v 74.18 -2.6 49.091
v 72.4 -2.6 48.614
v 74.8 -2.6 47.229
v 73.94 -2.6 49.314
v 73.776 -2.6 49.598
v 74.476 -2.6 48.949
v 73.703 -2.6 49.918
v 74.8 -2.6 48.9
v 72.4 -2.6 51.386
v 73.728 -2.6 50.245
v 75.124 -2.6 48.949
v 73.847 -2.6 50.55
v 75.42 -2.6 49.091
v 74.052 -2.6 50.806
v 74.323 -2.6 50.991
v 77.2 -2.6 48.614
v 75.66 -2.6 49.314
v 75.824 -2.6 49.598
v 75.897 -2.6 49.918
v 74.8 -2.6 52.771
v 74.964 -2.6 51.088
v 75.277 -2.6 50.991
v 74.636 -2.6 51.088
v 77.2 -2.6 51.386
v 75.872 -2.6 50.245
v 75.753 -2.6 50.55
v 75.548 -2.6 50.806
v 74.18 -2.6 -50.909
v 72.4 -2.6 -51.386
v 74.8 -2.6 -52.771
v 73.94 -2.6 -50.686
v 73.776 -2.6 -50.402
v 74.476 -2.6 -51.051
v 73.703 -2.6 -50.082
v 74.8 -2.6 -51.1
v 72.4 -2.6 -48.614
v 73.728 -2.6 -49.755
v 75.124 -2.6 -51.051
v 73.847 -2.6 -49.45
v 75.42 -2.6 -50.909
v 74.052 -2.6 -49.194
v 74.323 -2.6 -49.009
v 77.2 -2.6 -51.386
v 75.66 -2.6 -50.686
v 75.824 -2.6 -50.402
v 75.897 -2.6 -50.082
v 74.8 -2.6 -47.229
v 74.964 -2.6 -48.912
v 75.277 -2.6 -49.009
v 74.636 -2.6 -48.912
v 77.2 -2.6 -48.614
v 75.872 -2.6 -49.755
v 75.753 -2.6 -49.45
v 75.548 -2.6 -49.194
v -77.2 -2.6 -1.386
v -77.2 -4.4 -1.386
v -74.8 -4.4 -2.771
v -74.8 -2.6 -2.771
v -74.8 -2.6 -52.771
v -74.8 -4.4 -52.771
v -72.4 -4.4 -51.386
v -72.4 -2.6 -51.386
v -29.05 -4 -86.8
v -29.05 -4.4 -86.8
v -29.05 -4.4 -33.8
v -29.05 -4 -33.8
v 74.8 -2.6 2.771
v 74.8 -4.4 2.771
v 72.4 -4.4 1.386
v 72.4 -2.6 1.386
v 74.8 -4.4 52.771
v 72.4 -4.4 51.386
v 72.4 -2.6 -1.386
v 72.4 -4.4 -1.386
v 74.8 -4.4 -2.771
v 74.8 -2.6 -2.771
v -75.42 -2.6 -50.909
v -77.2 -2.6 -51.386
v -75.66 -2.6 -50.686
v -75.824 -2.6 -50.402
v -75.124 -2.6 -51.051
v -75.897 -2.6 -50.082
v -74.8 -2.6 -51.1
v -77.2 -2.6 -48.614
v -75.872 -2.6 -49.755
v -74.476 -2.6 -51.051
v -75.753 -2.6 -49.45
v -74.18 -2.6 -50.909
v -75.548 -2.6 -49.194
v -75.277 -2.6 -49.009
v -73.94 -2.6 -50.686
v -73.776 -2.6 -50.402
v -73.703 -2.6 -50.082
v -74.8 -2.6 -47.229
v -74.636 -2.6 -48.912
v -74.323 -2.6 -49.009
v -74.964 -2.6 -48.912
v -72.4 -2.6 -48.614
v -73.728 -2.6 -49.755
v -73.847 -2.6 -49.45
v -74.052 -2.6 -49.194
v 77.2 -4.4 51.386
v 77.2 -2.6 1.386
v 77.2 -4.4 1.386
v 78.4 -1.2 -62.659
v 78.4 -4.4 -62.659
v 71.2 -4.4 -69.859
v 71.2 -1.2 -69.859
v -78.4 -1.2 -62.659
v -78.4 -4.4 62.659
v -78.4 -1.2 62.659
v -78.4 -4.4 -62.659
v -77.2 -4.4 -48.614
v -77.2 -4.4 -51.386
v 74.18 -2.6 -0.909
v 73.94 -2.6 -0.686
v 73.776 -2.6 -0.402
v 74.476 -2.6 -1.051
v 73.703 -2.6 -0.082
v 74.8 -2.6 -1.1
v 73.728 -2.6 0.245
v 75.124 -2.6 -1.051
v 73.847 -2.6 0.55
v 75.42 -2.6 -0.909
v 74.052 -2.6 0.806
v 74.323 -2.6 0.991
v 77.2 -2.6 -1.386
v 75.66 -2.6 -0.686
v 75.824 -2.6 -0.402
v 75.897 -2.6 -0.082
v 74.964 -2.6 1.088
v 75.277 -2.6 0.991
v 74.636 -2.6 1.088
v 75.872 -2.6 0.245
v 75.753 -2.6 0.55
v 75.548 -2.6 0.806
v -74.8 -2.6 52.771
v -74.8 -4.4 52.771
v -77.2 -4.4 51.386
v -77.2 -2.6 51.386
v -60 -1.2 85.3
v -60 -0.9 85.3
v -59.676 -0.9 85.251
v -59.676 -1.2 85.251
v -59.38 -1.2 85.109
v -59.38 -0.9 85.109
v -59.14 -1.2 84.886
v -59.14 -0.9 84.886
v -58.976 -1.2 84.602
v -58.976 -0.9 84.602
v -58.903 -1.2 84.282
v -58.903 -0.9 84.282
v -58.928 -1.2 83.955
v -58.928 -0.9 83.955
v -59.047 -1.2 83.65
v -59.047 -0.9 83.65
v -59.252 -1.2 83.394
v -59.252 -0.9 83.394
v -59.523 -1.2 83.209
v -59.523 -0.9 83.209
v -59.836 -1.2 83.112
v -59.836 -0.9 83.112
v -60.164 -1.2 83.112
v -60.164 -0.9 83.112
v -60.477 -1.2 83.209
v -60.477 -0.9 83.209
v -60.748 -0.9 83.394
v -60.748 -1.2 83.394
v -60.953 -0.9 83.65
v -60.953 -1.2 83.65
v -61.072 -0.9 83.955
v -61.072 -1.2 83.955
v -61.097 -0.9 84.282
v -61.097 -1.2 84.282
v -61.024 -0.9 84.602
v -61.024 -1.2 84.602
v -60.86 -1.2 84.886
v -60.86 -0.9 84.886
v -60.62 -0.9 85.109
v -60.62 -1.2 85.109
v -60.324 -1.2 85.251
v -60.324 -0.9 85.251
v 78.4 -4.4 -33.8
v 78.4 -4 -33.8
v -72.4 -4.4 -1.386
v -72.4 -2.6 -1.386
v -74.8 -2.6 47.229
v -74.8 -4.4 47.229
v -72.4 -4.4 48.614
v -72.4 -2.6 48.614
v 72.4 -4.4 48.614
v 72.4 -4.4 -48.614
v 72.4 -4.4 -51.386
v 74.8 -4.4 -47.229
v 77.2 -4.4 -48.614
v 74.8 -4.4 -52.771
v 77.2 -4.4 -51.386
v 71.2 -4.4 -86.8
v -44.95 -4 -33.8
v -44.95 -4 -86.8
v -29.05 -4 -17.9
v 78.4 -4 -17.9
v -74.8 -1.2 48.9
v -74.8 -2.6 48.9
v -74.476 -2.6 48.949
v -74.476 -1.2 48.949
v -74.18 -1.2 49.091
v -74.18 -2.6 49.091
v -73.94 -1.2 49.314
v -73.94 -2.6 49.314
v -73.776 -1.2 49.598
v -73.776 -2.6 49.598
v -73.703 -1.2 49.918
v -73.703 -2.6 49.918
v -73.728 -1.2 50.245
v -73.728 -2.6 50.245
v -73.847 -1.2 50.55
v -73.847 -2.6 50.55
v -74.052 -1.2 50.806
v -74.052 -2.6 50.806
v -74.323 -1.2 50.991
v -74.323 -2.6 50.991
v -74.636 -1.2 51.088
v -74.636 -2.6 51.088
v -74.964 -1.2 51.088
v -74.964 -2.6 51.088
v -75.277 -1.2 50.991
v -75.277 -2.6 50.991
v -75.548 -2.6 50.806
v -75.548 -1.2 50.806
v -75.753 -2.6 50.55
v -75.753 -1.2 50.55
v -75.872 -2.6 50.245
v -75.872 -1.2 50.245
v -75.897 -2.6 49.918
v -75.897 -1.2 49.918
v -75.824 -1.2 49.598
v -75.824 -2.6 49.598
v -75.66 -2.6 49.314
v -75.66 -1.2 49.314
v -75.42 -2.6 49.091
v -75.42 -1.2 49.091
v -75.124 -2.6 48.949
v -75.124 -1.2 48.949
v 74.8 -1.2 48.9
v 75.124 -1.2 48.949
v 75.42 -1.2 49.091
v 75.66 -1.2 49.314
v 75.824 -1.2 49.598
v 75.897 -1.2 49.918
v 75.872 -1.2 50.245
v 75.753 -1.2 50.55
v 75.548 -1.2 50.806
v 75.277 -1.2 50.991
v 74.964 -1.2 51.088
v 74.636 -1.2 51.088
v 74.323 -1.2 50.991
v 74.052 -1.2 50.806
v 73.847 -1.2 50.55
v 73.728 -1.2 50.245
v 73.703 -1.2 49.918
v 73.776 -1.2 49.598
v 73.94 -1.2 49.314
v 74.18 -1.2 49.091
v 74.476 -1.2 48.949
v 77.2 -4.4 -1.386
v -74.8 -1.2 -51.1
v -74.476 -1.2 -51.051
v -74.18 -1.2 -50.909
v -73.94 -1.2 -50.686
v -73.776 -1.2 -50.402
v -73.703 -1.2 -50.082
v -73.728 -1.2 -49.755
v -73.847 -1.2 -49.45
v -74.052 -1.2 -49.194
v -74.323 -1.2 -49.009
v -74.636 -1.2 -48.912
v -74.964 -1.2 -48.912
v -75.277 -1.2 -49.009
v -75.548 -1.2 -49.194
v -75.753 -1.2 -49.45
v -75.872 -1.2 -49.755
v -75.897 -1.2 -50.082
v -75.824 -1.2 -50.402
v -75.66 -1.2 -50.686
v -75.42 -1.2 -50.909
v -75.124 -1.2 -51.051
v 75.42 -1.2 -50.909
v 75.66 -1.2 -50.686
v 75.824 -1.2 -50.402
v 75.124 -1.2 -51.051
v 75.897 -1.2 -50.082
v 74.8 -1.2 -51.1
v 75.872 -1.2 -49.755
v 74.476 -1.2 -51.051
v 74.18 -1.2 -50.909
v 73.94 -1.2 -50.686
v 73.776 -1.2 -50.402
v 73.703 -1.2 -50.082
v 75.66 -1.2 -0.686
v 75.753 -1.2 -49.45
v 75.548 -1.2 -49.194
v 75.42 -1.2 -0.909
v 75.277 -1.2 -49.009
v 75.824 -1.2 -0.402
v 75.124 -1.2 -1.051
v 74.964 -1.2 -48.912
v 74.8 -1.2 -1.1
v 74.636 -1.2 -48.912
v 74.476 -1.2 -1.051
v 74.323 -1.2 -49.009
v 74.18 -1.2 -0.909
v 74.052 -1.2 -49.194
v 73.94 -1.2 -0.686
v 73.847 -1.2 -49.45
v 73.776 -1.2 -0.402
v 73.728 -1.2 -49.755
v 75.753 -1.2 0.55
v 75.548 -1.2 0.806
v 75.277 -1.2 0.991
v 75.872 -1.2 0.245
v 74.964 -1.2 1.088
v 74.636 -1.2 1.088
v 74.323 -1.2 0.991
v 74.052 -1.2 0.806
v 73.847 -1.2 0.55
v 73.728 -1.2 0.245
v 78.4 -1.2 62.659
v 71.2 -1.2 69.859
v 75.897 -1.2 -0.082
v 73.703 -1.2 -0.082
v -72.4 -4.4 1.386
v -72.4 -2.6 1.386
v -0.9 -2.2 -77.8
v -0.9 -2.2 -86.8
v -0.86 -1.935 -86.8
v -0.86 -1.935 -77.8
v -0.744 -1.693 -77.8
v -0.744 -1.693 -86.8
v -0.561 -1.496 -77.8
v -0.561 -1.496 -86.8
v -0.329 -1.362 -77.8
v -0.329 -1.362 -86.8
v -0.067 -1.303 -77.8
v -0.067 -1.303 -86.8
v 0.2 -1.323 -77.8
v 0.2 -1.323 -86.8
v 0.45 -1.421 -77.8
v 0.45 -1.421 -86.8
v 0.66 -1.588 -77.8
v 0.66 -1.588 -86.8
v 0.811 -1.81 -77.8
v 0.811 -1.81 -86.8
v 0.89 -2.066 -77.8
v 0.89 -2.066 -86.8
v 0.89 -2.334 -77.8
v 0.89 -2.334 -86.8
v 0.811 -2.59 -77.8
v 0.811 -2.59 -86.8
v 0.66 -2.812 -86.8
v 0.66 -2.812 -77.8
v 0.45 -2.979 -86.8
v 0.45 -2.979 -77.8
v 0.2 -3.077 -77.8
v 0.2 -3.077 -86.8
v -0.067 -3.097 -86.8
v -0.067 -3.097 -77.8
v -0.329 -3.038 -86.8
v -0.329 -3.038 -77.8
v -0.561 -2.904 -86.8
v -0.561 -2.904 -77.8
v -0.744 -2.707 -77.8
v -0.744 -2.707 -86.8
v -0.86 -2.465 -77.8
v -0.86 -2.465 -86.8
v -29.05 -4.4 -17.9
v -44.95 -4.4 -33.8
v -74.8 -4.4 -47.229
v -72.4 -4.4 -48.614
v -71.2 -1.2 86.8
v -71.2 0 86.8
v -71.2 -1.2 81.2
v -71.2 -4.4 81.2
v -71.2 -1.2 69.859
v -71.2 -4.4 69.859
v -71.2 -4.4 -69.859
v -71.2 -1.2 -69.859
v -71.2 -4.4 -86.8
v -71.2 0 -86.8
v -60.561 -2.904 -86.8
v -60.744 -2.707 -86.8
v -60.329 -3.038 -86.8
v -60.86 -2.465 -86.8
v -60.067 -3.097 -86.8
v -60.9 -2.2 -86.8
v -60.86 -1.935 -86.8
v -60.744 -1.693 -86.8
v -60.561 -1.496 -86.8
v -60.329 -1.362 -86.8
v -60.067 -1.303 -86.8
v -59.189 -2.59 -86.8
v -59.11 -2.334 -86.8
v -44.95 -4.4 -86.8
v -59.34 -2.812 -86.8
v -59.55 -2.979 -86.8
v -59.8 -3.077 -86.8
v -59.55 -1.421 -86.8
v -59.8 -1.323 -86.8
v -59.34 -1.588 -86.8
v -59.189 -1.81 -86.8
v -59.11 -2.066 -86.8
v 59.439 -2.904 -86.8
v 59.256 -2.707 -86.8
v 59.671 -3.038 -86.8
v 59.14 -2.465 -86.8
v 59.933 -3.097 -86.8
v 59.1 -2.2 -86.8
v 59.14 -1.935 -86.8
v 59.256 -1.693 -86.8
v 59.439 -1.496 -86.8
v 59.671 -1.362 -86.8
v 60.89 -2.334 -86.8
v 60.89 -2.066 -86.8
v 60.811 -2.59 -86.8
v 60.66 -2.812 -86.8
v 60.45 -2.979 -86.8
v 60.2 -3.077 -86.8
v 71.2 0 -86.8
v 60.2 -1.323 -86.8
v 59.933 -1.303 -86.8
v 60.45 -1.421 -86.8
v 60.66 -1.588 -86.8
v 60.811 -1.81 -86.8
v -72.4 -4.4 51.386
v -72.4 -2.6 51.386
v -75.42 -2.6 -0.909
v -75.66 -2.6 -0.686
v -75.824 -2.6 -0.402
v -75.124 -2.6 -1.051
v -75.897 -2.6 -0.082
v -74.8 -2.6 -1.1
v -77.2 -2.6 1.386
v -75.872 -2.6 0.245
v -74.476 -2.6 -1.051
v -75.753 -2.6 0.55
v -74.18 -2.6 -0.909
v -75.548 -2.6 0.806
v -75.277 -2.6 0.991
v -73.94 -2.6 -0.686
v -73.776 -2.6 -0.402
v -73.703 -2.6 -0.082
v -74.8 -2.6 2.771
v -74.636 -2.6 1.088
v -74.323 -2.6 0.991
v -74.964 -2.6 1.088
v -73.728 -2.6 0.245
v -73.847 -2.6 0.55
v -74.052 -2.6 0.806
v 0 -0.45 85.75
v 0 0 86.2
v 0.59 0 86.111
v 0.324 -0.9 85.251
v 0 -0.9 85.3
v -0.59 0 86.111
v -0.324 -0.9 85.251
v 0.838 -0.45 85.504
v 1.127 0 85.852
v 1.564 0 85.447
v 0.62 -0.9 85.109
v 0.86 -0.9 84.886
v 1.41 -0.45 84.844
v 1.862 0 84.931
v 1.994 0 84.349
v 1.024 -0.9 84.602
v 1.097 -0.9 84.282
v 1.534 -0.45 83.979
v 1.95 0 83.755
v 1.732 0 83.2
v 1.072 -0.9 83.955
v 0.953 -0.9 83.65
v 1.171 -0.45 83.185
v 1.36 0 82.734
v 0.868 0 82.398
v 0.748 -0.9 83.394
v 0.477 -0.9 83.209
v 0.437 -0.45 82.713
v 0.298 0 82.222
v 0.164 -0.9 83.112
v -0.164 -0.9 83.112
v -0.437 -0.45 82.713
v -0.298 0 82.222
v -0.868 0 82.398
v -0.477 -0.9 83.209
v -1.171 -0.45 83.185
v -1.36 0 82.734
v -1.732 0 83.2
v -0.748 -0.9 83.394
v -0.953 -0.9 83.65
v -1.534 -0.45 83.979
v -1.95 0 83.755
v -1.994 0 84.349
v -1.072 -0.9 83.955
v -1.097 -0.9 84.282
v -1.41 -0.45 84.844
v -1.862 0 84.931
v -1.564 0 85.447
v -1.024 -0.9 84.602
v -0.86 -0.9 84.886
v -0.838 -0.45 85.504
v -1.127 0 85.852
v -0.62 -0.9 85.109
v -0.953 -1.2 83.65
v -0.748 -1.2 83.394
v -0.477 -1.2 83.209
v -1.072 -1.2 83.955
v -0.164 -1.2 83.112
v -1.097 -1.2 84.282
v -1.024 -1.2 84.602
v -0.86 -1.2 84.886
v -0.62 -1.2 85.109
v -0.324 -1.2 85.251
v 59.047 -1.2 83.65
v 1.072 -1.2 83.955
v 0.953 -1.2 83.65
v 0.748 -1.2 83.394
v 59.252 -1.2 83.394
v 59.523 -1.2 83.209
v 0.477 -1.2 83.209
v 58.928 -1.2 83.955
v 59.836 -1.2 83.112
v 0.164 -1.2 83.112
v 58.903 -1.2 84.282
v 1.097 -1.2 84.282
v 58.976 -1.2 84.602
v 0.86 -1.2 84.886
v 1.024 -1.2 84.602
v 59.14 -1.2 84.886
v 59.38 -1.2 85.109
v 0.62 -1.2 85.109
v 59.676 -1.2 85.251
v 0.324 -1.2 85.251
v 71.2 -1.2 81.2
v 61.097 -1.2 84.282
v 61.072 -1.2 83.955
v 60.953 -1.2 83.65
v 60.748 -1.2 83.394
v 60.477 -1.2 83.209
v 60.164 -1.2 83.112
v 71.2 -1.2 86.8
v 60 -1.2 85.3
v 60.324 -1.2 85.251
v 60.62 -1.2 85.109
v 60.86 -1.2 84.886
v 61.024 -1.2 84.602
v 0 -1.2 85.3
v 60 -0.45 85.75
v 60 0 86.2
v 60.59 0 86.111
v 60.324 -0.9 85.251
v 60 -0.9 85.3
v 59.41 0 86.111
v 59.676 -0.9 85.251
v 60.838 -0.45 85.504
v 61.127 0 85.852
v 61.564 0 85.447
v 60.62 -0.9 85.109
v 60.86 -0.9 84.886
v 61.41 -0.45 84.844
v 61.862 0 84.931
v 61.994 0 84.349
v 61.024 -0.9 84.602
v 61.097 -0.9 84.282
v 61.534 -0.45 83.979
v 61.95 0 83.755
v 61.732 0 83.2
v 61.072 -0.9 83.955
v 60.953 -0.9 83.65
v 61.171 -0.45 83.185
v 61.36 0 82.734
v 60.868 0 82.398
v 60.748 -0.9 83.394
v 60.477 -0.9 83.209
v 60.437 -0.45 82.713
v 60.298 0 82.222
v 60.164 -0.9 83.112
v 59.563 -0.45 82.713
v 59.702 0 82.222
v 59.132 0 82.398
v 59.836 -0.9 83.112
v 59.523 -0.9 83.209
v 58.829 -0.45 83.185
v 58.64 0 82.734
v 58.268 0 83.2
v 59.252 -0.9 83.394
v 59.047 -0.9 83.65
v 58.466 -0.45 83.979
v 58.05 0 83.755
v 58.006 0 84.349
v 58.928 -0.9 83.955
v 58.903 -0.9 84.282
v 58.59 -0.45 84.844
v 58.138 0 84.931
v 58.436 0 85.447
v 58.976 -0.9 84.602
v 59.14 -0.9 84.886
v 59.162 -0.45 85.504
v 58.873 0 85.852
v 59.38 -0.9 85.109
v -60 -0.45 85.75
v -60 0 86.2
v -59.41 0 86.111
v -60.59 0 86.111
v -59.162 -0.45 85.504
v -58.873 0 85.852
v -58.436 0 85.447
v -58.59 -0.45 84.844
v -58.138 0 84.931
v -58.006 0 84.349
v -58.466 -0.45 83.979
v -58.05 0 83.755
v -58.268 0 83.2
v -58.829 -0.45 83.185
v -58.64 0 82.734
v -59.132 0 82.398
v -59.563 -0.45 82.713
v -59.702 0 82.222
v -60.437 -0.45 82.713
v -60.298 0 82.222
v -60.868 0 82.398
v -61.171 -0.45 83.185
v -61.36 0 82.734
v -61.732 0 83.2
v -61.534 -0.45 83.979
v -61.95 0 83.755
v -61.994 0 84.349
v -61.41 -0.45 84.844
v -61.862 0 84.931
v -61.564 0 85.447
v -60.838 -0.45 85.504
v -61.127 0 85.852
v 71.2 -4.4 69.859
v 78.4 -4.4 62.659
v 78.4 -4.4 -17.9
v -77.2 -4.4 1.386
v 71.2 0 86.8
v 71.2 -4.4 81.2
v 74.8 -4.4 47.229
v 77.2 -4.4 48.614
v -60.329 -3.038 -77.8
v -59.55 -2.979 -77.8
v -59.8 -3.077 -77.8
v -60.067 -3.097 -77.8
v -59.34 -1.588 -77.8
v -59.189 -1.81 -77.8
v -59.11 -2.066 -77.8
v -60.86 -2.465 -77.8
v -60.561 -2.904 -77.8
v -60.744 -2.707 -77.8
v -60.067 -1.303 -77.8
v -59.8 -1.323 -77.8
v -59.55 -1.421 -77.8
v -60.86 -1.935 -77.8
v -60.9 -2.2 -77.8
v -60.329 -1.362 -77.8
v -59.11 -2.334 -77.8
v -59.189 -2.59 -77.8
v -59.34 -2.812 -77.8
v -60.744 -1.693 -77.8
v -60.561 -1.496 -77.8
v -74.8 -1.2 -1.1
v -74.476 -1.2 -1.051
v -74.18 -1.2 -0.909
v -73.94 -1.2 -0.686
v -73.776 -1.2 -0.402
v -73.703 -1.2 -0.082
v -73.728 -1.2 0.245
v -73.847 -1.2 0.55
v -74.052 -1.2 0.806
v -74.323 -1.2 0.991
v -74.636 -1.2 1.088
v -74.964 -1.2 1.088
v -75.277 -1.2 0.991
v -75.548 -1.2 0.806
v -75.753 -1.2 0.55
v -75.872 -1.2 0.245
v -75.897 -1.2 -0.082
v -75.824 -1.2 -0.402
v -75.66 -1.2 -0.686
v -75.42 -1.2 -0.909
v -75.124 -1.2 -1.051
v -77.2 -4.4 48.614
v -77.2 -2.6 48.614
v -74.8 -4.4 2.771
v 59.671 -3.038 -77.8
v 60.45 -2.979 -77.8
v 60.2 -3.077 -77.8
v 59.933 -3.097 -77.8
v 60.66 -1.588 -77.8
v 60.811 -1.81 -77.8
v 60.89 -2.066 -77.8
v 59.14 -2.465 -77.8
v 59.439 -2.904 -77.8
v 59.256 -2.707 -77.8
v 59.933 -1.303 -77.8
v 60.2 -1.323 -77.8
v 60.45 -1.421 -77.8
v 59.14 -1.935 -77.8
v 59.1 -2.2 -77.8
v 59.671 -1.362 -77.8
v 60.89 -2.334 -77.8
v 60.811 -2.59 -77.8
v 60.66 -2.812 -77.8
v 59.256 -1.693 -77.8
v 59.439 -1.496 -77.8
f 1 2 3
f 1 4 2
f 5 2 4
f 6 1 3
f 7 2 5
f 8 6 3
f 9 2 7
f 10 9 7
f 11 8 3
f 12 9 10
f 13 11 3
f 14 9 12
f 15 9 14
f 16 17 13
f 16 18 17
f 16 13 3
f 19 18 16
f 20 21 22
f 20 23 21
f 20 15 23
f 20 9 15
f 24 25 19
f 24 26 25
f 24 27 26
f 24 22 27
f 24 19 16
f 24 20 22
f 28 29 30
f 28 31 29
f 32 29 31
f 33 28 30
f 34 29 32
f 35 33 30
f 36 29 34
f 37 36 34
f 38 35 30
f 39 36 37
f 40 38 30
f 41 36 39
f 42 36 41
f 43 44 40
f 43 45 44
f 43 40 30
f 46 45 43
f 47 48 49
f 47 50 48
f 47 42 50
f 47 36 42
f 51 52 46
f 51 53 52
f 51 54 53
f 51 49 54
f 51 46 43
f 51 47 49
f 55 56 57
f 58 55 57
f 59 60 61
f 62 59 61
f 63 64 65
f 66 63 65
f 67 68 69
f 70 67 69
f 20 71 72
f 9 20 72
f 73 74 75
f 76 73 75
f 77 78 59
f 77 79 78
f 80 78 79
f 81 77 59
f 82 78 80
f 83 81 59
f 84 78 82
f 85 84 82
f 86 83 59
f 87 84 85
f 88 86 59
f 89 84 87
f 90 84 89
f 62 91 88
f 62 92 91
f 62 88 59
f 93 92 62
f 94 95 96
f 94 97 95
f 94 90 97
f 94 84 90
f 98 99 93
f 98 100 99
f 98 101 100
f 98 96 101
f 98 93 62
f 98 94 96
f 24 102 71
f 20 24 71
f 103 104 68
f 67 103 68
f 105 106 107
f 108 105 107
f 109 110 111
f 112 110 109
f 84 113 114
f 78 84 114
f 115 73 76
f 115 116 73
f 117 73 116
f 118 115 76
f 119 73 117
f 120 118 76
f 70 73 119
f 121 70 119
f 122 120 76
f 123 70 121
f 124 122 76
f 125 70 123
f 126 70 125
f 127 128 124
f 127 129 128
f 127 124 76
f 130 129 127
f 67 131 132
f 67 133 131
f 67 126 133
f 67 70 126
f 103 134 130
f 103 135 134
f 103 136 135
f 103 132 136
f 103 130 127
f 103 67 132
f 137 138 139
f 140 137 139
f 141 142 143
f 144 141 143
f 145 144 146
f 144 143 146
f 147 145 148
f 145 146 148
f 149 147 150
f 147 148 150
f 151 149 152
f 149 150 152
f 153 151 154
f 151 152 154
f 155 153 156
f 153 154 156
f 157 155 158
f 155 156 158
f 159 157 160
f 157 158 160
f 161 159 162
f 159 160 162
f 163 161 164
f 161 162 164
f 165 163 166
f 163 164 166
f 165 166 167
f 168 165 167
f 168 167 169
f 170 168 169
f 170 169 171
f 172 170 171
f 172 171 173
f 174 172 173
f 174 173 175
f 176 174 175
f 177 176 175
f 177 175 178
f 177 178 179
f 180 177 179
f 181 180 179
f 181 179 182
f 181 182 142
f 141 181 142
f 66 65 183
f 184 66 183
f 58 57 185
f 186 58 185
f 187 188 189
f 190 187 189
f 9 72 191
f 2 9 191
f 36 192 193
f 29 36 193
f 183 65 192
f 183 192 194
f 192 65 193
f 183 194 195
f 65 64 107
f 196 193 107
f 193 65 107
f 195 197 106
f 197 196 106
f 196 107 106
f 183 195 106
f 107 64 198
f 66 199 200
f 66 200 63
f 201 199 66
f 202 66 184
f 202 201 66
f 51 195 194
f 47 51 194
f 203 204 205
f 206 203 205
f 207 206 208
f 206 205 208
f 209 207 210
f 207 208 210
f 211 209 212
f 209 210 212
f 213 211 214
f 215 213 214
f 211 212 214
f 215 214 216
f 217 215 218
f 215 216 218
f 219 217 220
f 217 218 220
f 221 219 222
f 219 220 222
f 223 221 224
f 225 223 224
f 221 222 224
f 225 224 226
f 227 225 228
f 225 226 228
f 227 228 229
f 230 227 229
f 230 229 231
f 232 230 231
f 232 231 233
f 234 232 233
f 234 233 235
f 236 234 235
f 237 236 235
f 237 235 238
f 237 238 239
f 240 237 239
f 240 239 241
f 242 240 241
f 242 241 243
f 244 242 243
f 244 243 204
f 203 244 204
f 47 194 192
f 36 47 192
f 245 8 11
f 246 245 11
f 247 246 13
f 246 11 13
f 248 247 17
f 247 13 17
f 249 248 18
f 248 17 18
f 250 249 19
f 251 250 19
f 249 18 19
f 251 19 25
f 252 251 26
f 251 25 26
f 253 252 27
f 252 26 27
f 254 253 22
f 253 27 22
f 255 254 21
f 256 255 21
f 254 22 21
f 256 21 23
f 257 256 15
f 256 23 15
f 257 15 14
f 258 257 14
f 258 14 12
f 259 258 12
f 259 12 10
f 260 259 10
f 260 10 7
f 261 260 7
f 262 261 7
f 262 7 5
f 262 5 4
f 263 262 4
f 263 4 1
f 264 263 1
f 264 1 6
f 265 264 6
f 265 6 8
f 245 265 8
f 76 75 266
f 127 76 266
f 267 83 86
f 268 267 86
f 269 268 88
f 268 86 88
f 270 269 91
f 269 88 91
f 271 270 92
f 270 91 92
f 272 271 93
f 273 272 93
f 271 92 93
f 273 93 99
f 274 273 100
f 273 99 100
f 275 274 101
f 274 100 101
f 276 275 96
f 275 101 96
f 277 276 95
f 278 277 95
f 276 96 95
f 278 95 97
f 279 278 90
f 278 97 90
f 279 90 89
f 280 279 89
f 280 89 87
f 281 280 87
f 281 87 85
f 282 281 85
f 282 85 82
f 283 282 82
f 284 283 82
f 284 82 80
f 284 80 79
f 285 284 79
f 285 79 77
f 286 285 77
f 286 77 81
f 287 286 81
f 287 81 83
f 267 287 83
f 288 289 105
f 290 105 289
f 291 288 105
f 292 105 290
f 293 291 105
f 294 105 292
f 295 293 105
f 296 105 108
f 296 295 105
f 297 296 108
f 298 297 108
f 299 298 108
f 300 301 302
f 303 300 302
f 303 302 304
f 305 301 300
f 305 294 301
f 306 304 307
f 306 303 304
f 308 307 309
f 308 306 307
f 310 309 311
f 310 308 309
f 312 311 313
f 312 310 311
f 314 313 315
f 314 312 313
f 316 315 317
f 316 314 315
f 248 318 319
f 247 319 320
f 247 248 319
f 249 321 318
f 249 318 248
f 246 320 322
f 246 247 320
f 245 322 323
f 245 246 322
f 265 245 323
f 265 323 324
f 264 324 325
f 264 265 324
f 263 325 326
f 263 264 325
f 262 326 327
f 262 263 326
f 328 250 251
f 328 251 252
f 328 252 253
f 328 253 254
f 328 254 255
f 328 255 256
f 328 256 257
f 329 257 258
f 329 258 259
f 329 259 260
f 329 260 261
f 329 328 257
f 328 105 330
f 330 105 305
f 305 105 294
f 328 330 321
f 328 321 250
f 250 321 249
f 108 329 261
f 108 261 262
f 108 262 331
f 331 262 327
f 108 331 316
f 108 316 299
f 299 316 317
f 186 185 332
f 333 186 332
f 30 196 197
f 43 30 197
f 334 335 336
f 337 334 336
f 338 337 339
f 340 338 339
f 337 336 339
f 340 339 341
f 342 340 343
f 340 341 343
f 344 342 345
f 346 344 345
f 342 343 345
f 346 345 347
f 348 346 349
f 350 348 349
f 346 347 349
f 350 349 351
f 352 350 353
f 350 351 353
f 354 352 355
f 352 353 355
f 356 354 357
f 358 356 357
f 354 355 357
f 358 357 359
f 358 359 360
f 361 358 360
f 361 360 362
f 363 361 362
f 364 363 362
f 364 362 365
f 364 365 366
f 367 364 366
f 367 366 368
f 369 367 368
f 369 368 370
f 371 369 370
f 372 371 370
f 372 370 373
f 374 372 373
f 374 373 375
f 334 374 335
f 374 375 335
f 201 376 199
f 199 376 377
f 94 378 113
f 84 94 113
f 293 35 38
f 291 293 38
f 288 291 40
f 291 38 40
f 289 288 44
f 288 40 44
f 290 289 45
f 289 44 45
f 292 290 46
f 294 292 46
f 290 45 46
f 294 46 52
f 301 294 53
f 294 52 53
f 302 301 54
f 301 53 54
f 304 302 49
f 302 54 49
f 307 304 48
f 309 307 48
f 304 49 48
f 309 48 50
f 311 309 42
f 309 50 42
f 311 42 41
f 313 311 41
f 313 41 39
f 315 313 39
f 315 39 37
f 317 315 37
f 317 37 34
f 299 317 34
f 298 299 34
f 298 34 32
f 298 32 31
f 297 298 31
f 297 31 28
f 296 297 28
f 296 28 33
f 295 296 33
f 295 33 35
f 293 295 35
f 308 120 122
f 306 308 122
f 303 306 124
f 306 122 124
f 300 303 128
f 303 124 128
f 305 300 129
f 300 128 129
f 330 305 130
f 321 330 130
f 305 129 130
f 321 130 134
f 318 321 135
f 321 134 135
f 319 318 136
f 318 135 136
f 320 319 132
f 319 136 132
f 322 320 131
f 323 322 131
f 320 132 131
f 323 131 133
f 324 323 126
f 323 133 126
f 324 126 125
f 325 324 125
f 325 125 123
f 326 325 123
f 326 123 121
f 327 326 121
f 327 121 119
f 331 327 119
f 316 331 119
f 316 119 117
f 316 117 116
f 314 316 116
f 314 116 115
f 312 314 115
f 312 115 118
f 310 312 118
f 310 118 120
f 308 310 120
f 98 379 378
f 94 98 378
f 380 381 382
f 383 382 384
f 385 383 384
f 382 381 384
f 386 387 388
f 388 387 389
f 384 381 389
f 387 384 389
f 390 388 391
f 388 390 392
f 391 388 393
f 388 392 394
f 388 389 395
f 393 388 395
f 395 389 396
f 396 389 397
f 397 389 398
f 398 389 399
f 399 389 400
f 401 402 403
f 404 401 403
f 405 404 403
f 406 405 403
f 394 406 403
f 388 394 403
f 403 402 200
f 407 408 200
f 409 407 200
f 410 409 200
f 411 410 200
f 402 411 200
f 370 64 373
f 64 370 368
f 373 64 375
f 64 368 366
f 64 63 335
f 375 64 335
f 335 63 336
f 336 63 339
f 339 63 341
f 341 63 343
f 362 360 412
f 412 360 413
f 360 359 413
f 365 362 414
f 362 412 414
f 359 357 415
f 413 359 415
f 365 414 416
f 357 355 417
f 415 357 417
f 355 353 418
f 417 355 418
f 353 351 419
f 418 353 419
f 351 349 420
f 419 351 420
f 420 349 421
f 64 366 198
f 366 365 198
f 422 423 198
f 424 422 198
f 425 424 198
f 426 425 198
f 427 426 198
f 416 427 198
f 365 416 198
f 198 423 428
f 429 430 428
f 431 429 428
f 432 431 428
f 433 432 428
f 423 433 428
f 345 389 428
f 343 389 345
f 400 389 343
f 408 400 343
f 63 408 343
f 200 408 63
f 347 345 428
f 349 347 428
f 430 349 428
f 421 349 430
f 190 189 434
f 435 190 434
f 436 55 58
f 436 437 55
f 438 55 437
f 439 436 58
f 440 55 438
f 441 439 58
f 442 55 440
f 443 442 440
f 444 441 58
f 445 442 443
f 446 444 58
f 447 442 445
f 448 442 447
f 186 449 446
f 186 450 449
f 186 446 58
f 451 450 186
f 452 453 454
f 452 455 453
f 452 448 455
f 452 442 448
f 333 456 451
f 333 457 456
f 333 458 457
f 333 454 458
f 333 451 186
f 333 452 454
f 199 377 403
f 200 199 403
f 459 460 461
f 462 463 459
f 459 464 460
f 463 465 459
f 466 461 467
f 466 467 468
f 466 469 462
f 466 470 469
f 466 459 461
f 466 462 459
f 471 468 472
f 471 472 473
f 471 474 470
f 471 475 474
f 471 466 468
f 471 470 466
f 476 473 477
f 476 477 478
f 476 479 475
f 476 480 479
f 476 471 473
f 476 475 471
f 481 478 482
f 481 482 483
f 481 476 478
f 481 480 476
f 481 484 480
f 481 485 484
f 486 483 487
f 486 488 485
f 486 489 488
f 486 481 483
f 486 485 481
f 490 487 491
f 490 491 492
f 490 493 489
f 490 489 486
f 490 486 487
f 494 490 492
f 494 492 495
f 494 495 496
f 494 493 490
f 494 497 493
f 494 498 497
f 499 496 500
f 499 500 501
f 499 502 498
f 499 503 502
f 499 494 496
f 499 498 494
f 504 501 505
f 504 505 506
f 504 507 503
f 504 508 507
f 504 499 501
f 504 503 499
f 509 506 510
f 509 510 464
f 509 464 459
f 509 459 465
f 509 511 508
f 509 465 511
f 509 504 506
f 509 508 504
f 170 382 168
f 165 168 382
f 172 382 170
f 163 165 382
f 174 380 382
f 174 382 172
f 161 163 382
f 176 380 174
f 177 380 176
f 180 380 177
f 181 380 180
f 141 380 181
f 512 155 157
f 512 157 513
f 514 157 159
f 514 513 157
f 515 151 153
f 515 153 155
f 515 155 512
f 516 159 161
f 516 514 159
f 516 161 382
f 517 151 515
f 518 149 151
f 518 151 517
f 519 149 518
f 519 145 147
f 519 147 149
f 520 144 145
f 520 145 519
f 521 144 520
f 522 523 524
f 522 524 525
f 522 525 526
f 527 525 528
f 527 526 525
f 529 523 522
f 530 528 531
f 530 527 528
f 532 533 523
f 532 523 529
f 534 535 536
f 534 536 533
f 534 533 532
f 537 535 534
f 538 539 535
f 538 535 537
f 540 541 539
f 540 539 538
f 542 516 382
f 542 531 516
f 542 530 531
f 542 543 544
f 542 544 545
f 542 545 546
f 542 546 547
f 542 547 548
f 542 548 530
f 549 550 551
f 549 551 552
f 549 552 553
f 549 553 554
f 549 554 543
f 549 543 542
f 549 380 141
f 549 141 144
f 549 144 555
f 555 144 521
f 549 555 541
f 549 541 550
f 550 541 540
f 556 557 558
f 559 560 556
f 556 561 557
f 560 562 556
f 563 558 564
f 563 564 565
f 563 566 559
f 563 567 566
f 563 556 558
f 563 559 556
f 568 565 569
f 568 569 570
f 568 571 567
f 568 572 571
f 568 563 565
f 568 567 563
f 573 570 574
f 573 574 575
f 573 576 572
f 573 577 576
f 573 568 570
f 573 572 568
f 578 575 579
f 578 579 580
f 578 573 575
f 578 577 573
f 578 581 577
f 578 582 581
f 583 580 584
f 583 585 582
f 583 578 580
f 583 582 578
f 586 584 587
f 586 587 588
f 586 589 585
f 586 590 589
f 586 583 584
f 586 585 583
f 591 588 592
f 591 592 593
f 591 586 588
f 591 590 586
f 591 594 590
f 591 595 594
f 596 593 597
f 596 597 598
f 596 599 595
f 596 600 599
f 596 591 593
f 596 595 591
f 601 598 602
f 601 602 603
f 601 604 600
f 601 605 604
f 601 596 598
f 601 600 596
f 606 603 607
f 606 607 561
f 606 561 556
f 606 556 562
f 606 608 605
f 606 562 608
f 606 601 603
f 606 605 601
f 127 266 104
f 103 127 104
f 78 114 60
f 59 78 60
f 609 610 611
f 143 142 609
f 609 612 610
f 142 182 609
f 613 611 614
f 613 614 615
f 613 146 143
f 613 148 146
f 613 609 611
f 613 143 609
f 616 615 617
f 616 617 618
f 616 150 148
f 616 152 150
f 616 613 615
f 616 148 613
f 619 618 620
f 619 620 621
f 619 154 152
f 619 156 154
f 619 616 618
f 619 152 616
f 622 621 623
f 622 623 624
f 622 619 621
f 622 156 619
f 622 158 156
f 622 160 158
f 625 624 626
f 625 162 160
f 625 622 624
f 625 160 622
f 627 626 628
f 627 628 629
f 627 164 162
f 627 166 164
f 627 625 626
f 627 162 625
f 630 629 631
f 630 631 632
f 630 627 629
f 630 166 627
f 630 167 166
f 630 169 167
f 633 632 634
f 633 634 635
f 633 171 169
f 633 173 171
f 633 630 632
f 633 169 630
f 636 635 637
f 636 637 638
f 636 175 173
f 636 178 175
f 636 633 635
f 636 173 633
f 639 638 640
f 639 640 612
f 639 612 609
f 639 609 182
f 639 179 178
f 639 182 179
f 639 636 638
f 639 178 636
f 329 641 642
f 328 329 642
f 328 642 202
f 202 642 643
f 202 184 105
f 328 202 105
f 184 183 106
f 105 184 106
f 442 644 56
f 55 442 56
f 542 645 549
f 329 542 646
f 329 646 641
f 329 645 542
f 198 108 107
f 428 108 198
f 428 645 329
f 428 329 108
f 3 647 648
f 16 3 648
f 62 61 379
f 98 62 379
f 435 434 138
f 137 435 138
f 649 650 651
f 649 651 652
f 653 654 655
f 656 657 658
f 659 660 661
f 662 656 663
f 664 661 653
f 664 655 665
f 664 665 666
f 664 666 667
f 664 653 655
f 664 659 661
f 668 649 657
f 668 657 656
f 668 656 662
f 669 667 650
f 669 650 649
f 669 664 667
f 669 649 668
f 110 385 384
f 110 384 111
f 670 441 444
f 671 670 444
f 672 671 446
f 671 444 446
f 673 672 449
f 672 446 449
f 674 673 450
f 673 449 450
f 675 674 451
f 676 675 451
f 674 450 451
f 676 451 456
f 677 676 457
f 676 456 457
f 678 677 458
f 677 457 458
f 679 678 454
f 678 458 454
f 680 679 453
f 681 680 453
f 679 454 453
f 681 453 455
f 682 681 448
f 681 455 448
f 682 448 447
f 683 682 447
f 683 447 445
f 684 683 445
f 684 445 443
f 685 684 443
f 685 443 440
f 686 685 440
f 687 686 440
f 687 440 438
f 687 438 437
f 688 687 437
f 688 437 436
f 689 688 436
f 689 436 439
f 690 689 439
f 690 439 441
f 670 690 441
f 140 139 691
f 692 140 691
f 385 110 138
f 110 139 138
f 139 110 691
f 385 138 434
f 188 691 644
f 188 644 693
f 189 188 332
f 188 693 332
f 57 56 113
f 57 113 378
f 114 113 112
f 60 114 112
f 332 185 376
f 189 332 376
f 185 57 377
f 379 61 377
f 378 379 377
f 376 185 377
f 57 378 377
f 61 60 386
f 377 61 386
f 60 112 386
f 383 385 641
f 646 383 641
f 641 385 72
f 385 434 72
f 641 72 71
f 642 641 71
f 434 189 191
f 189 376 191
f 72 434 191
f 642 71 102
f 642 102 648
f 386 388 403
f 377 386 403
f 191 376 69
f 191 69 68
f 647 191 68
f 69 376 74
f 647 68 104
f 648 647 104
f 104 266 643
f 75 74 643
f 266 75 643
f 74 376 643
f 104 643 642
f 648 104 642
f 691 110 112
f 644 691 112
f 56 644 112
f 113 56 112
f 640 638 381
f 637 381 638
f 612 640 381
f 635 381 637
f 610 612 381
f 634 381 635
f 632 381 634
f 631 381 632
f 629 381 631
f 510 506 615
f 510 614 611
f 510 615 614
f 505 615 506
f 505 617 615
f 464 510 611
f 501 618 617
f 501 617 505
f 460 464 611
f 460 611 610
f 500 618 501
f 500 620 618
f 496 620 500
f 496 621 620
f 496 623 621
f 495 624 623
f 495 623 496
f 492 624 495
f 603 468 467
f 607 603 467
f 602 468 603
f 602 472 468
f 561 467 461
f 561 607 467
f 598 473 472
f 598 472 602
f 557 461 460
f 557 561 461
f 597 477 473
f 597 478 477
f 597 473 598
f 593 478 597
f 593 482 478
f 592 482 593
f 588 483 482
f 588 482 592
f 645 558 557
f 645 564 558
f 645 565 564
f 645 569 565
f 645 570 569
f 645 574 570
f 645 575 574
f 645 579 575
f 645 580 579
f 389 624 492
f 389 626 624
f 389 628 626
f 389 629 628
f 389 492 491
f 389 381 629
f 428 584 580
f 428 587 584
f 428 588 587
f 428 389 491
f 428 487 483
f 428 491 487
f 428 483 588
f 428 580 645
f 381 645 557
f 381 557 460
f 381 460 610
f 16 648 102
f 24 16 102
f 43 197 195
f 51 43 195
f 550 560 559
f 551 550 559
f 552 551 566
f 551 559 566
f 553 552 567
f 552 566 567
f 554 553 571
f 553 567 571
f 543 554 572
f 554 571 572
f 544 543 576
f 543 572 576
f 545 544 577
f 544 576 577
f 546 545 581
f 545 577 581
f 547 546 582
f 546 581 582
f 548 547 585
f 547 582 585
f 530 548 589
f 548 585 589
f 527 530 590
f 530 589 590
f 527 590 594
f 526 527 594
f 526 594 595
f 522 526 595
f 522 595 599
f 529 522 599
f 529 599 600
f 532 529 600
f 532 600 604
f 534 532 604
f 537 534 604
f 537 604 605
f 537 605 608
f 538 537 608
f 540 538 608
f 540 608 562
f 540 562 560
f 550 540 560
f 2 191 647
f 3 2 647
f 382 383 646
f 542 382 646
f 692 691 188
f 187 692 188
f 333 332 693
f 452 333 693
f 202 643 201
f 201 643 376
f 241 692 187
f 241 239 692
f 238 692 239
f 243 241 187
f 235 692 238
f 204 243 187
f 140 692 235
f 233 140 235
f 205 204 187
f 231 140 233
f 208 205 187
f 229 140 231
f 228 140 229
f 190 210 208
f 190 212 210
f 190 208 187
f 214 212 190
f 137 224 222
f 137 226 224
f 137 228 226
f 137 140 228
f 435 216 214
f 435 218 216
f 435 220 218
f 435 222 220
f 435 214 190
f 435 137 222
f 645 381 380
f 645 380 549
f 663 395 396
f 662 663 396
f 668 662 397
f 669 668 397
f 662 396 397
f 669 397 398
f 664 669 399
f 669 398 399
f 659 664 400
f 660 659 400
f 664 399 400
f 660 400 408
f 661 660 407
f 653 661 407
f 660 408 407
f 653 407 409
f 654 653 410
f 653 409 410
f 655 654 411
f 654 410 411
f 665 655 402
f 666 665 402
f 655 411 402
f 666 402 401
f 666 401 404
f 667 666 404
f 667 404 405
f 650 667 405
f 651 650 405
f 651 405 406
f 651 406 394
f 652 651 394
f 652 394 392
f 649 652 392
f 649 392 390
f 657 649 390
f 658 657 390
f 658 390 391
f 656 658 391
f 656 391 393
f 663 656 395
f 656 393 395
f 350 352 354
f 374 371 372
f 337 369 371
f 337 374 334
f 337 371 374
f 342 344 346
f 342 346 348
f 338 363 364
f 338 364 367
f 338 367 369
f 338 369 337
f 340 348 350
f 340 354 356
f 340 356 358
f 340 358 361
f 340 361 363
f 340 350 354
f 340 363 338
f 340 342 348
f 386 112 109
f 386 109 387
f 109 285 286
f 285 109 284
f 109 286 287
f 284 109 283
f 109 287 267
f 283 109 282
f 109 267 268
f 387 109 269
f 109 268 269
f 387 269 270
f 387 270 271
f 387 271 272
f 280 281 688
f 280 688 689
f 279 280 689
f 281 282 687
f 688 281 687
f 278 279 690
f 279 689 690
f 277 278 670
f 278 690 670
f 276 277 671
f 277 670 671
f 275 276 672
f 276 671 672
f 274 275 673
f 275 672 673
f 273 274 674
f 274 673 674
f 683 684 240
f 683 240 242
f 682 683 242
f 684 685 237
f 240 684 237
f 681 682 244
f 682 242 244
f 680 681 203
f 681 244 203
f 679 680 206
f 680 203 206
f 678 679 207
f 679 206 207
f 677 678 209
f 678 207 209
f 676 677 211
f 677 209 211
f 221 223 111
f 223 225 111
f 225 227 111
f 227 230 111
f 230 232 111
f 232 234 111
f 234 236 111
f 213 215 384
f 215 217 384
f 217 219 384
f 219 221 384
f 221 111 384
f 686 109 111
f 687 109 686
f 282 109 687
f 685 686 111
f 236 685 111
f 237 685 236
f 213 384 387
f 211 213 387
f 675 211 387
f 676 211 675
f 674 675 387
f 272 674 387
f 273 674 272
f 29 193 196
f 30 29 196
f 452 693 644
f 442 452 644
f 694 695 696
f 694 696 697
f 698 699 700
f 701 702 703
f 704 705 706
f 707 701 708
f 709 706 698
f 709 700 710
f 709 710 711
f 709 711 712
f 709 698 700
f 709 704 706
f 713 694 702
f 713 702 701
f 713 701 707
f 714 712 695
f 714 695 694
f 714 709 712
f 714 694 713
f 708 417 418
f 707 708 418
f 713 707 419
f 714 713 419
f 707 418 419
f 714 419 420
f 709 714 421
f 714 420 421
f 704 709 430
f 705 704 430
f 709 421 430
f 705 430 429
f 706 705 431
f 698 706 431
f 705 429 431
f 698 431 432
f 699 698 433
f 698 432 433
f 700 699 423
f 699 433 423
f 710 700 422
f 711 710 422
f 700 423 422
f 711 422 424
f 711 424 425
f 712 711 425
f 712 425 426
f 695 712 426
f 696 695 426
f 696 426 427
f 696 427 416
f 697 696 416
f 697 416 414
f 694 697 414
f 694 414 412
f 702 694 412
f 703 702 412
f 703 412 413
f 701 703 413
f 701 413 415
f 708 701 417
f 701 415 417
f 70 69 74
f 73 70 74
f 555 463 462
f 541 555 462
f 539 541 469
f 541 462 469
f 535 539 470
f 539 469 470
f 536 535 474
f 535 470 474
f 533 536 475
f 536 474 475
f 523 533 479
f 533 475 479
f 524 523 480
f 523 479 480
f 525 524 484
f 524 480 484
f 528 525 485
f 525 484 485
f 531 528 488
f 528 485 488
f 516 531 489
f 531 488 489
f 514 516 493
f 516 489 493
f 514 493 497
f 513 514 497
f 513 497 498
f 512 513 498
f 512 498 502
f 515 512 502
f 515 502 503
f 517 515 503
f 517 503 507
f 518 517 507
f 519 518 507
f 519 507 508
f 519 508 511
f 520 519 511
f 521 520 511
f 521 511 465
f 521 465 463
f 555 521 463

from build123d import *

# Parameters (mm, degrees)
SKETCH1_W           = 142.4
SKETCH1_H           = 173.6
BOSS_EXTRUDE1_DEPTH = 4.4
SKETCH2_W           = 142.4
SKETCH2_H           = 5.6
CUT_EXTRUDE1_DEPTH  = 3.2
CUT_EXTRUDE2_REACH  = 114.352
SKETCH3_R           = 1.1
SKETCH4_R           = 0.9
CUT_EXTRUDE3_DEPTH  = 9
CHAMFER2_SIZE       = 0.9
BOSS_EXTRUDE2_DEPTH = 3.2
SKETCH6_R           = 1.1
CUT_EXTRUDE4_DEPTH  = 118.047682591
CUT_EXTRUDE5_DEPTH  = 1.8
CUT_EXTRUDE6_DEPTH  = 0.4


with BuildPart() as part:
    # Sketch1 → Boss-Extrude1 (new body)
    with BuildSketch(Plane(origin=(0, 0, 0), x_dir=(1, 0, 0), z_dir=(0, 1, 0))):
        Rectangle(SKETCH1_W, SKETCH1_H)
    extrude(amount=-BOSS_EXTRUDE1_DEPTH)

    # Sketch2 → Cut-Extrude1 (cut)
    with BuildSketch(Plane.XZ.offset(4.4)):
        with Locations((0, 84)):
            Rectangle(SKETCH2_W, SKETCH2_H)
    extrude(amount=-CUT_EXTRUDE1_DEPTH, mode=Mode.SUBTRACT)

    # Sketch3 → Cut-Extrude2 (cut, up to next)
    with BuildSketch(Plane(origin=(0, 0, 0), x_dir=(1, 0, 0), z_dir=(0, 1, 0)), mode=Mode.PRIVATE) as cut_extrude2_sk1:
        with Locations(Location((60, -84.2, 0), (0, 0, 270))):
            Circle(SKETCH3_R)
    cut_extrude2_tool1 = extrude(cut_extrude2_sk1.sketch, amount=-CUT_EXTRUDE2_REACH, mode=Mode.PRIVATE) & part.part
    # Sketch3 → Cut-Extrude2 (cut, up to next)
    with BuildSketch(Plane(origin=(0, 0, 0), x_dir=(1, 0, 0), z_dir=(0, 1, 0)), mode=Mode.PRIVATE) as cut_extrude2_sk2:
        with Locations(Location((-60, -84.2, 0), (0, 0, 270))):
            Circle(SKETCH3_R)
    cut_extrude2_tool2 = extrude(cut_extrude2_sk2.sketch, amount=-CUT_EXTRUDE2_REACH, mode=Mode.PRIVATE) & part.part
    # Sketch3 → Cut-Extrude2 (cut, up to next)
    with BuildSketch(Plane(origin=(0, 0, 0), x_dir=(1, 0, 0), z_dir=(0, 1, 0)), mode=Mode.PRIVATE) as cut_extrude2_sk3:
        with Locations(Location((0, -84.2, 0), (0, 0, 270))):
            Circle(SKETCH3_R)
    cut_extrude2_tool3 = extrude(cut_extrude2_sk3.sketch, amount=-CUT_EXTRUDE2_REACH, mode=Mode.PRIVATE) & part.part
    add(cut_extrude2_tool1.solids().sort_by_distance((60, 0, 84.2))[0], mode=Mode.SUBTRACT)
    add(cut_extrude2_tool2.solids().sort_by_distance((-60, 0, 84.2))[0], mode=Mode.SUBTRACT)
    add(cut_extrude2_tool3.solids().sort_by_distance((0, 0, 84.2))[0], mode=Mode.SUBTRACT)

    # Sketch4 → Cut-Extrude3 (cut)
    with BuildSketch(Plane(origin=(0, 0, -86.8), x_dir=(-1, 0, 0), z_dir=(0, 0, -1))):
        with Locations((0, -2.2)):
            Circle(SKETCH4_R)
        with Locations((60, -2.2)):
            Circle(SKETCH4_R)
        with Locations((-60, -2.2)):
            Circle(SKETCH4_R)
    extrude(amount=-CUT_EXTRUDE3_DEPTH, mode=Mode.SUBTRACT)

    # Chamfer2
    chamfer2_edges = [part.edges().sort_by_distance(p)[0] for p in [
        (60, 0, 83.1),
        (-60, 0, 83.1),
        (0, 0, 83.1),
    ]]
    chamfer(chamfer2_edges, length=CHAMFER2_SIZE)

    # Sketch5 → Boss-Extrude2 (add)
    with BuildSketch(Plane.XZ.offset(4.4)):
        Polygon((-71.2, 69.858578644), (-78.4, 62.658578644), (-78.4, -62.658578644), (-71.2, -69.858578644), align=None)
        Polygon((71.2, 69.858578644), (78.4, 62.658578644), (78.4, -62.658578644), (71.2, -69.858578644), align=None)
    extrude(amount=-BOSS_EXTRUDE2_DEPTH)

    # Sketch6 → Cut-Extrude4 (cut, through all)
    with BuildSketch(Plane.XZ.offset(4.4)):
        with Locations(Location((74.8, 50, 0), (0, 0, 270))):
            Circle(SKETCH6_R)
        with Locations(Location((74.8, 0, 0), (0, 0, 270))):
            Circle(SKETCH6_R)
        with Locations(Location((74.8, -50, 0), (0, 0, 270))):
            Circle(SKETCH6_R)
        with Locations(Location((-74.8, 50, 0), (0, 0, 270))):
            Circle(SKETCH6_R)
        with Locations(Location((-74.8, 0, 0), (0, 0, 270))):
            Circle(SKETCH6_R)
        with Locations(Location((-74.8, -50, 0), (0, 0, 270))):
            Circle(SKETCH6_R)
    extrude(amount=-CUT_EXTRUDE4_DEPTH, mode=Mode.SUBTRACT)

    # Sketch7 → Cut-Extrude5 (cut)
    with BuildSketch(Plane.XZ.offset(4.4)):
        Polygon((72.4, 48.614359354), (74.8, 47.228718708), (77.2, 48.614359354), (77.2, 51.385640646), (74.8, 52.771281292), (72.4, 51.385640646), align=None)
        Polygon((77.2, 1.385640646), (74.8, 2.771281292), (72.4, 1.385640646), (72.4, -1.385640646), (74.8, -2.771281292), (77.2, -1.385640646), align=None)
        Polygon((77.2, -48.614359354), (74.8, -47.228718708), (72.4, -48.614359354), (72.4, -51.385640646), (74.8, -52.771281292), (77.2, -51.385640646), align=None)
        Polygon((-72.4, -51.385640646), (-72.4, -48.614359354), (-74.8, -47.228718708), (-77.2, -48.614359354), (-77.2, -51.385640646), (-74.8, -52.771281292), align=None)
        Polygon((-72.4, -1.385640646), (-72.4, 1.385640646), (-74.8, 2.771281292), (-77.2, 1.385640646), (-77.2, -1.385640646), (-74.8, -2.771281292), align=None)
        Polygon((-72.4, 48.614359354), (-72.4, 51.385640646), (-74.8, 52.771281292), (-77.2, 51.385640646), (-77.2, 48.614359354), (-74.8, 47.228718708), align=None)
    extrude(amount=-CUT_EXTRUDE5_DEPTH, mode=Mode.SUBTRACT)

    # Sketch8 → Cut-Extrude6 (cut)
    with BuildSketch(Plane.XZ.offset(4.4)):
        Polygon((78.4, -17.9), (-29.05, -17.9), (-44.95, -33.8), (-44.95, -86.8), (-29.05, -86.8), (-29.05, -33.8), (78.4, -33.8), align=None)
    extrude(amount=-CUT_EXTRUDE6_DEPTH, mode=Mode.SUBTRACT)


solid = part.part
